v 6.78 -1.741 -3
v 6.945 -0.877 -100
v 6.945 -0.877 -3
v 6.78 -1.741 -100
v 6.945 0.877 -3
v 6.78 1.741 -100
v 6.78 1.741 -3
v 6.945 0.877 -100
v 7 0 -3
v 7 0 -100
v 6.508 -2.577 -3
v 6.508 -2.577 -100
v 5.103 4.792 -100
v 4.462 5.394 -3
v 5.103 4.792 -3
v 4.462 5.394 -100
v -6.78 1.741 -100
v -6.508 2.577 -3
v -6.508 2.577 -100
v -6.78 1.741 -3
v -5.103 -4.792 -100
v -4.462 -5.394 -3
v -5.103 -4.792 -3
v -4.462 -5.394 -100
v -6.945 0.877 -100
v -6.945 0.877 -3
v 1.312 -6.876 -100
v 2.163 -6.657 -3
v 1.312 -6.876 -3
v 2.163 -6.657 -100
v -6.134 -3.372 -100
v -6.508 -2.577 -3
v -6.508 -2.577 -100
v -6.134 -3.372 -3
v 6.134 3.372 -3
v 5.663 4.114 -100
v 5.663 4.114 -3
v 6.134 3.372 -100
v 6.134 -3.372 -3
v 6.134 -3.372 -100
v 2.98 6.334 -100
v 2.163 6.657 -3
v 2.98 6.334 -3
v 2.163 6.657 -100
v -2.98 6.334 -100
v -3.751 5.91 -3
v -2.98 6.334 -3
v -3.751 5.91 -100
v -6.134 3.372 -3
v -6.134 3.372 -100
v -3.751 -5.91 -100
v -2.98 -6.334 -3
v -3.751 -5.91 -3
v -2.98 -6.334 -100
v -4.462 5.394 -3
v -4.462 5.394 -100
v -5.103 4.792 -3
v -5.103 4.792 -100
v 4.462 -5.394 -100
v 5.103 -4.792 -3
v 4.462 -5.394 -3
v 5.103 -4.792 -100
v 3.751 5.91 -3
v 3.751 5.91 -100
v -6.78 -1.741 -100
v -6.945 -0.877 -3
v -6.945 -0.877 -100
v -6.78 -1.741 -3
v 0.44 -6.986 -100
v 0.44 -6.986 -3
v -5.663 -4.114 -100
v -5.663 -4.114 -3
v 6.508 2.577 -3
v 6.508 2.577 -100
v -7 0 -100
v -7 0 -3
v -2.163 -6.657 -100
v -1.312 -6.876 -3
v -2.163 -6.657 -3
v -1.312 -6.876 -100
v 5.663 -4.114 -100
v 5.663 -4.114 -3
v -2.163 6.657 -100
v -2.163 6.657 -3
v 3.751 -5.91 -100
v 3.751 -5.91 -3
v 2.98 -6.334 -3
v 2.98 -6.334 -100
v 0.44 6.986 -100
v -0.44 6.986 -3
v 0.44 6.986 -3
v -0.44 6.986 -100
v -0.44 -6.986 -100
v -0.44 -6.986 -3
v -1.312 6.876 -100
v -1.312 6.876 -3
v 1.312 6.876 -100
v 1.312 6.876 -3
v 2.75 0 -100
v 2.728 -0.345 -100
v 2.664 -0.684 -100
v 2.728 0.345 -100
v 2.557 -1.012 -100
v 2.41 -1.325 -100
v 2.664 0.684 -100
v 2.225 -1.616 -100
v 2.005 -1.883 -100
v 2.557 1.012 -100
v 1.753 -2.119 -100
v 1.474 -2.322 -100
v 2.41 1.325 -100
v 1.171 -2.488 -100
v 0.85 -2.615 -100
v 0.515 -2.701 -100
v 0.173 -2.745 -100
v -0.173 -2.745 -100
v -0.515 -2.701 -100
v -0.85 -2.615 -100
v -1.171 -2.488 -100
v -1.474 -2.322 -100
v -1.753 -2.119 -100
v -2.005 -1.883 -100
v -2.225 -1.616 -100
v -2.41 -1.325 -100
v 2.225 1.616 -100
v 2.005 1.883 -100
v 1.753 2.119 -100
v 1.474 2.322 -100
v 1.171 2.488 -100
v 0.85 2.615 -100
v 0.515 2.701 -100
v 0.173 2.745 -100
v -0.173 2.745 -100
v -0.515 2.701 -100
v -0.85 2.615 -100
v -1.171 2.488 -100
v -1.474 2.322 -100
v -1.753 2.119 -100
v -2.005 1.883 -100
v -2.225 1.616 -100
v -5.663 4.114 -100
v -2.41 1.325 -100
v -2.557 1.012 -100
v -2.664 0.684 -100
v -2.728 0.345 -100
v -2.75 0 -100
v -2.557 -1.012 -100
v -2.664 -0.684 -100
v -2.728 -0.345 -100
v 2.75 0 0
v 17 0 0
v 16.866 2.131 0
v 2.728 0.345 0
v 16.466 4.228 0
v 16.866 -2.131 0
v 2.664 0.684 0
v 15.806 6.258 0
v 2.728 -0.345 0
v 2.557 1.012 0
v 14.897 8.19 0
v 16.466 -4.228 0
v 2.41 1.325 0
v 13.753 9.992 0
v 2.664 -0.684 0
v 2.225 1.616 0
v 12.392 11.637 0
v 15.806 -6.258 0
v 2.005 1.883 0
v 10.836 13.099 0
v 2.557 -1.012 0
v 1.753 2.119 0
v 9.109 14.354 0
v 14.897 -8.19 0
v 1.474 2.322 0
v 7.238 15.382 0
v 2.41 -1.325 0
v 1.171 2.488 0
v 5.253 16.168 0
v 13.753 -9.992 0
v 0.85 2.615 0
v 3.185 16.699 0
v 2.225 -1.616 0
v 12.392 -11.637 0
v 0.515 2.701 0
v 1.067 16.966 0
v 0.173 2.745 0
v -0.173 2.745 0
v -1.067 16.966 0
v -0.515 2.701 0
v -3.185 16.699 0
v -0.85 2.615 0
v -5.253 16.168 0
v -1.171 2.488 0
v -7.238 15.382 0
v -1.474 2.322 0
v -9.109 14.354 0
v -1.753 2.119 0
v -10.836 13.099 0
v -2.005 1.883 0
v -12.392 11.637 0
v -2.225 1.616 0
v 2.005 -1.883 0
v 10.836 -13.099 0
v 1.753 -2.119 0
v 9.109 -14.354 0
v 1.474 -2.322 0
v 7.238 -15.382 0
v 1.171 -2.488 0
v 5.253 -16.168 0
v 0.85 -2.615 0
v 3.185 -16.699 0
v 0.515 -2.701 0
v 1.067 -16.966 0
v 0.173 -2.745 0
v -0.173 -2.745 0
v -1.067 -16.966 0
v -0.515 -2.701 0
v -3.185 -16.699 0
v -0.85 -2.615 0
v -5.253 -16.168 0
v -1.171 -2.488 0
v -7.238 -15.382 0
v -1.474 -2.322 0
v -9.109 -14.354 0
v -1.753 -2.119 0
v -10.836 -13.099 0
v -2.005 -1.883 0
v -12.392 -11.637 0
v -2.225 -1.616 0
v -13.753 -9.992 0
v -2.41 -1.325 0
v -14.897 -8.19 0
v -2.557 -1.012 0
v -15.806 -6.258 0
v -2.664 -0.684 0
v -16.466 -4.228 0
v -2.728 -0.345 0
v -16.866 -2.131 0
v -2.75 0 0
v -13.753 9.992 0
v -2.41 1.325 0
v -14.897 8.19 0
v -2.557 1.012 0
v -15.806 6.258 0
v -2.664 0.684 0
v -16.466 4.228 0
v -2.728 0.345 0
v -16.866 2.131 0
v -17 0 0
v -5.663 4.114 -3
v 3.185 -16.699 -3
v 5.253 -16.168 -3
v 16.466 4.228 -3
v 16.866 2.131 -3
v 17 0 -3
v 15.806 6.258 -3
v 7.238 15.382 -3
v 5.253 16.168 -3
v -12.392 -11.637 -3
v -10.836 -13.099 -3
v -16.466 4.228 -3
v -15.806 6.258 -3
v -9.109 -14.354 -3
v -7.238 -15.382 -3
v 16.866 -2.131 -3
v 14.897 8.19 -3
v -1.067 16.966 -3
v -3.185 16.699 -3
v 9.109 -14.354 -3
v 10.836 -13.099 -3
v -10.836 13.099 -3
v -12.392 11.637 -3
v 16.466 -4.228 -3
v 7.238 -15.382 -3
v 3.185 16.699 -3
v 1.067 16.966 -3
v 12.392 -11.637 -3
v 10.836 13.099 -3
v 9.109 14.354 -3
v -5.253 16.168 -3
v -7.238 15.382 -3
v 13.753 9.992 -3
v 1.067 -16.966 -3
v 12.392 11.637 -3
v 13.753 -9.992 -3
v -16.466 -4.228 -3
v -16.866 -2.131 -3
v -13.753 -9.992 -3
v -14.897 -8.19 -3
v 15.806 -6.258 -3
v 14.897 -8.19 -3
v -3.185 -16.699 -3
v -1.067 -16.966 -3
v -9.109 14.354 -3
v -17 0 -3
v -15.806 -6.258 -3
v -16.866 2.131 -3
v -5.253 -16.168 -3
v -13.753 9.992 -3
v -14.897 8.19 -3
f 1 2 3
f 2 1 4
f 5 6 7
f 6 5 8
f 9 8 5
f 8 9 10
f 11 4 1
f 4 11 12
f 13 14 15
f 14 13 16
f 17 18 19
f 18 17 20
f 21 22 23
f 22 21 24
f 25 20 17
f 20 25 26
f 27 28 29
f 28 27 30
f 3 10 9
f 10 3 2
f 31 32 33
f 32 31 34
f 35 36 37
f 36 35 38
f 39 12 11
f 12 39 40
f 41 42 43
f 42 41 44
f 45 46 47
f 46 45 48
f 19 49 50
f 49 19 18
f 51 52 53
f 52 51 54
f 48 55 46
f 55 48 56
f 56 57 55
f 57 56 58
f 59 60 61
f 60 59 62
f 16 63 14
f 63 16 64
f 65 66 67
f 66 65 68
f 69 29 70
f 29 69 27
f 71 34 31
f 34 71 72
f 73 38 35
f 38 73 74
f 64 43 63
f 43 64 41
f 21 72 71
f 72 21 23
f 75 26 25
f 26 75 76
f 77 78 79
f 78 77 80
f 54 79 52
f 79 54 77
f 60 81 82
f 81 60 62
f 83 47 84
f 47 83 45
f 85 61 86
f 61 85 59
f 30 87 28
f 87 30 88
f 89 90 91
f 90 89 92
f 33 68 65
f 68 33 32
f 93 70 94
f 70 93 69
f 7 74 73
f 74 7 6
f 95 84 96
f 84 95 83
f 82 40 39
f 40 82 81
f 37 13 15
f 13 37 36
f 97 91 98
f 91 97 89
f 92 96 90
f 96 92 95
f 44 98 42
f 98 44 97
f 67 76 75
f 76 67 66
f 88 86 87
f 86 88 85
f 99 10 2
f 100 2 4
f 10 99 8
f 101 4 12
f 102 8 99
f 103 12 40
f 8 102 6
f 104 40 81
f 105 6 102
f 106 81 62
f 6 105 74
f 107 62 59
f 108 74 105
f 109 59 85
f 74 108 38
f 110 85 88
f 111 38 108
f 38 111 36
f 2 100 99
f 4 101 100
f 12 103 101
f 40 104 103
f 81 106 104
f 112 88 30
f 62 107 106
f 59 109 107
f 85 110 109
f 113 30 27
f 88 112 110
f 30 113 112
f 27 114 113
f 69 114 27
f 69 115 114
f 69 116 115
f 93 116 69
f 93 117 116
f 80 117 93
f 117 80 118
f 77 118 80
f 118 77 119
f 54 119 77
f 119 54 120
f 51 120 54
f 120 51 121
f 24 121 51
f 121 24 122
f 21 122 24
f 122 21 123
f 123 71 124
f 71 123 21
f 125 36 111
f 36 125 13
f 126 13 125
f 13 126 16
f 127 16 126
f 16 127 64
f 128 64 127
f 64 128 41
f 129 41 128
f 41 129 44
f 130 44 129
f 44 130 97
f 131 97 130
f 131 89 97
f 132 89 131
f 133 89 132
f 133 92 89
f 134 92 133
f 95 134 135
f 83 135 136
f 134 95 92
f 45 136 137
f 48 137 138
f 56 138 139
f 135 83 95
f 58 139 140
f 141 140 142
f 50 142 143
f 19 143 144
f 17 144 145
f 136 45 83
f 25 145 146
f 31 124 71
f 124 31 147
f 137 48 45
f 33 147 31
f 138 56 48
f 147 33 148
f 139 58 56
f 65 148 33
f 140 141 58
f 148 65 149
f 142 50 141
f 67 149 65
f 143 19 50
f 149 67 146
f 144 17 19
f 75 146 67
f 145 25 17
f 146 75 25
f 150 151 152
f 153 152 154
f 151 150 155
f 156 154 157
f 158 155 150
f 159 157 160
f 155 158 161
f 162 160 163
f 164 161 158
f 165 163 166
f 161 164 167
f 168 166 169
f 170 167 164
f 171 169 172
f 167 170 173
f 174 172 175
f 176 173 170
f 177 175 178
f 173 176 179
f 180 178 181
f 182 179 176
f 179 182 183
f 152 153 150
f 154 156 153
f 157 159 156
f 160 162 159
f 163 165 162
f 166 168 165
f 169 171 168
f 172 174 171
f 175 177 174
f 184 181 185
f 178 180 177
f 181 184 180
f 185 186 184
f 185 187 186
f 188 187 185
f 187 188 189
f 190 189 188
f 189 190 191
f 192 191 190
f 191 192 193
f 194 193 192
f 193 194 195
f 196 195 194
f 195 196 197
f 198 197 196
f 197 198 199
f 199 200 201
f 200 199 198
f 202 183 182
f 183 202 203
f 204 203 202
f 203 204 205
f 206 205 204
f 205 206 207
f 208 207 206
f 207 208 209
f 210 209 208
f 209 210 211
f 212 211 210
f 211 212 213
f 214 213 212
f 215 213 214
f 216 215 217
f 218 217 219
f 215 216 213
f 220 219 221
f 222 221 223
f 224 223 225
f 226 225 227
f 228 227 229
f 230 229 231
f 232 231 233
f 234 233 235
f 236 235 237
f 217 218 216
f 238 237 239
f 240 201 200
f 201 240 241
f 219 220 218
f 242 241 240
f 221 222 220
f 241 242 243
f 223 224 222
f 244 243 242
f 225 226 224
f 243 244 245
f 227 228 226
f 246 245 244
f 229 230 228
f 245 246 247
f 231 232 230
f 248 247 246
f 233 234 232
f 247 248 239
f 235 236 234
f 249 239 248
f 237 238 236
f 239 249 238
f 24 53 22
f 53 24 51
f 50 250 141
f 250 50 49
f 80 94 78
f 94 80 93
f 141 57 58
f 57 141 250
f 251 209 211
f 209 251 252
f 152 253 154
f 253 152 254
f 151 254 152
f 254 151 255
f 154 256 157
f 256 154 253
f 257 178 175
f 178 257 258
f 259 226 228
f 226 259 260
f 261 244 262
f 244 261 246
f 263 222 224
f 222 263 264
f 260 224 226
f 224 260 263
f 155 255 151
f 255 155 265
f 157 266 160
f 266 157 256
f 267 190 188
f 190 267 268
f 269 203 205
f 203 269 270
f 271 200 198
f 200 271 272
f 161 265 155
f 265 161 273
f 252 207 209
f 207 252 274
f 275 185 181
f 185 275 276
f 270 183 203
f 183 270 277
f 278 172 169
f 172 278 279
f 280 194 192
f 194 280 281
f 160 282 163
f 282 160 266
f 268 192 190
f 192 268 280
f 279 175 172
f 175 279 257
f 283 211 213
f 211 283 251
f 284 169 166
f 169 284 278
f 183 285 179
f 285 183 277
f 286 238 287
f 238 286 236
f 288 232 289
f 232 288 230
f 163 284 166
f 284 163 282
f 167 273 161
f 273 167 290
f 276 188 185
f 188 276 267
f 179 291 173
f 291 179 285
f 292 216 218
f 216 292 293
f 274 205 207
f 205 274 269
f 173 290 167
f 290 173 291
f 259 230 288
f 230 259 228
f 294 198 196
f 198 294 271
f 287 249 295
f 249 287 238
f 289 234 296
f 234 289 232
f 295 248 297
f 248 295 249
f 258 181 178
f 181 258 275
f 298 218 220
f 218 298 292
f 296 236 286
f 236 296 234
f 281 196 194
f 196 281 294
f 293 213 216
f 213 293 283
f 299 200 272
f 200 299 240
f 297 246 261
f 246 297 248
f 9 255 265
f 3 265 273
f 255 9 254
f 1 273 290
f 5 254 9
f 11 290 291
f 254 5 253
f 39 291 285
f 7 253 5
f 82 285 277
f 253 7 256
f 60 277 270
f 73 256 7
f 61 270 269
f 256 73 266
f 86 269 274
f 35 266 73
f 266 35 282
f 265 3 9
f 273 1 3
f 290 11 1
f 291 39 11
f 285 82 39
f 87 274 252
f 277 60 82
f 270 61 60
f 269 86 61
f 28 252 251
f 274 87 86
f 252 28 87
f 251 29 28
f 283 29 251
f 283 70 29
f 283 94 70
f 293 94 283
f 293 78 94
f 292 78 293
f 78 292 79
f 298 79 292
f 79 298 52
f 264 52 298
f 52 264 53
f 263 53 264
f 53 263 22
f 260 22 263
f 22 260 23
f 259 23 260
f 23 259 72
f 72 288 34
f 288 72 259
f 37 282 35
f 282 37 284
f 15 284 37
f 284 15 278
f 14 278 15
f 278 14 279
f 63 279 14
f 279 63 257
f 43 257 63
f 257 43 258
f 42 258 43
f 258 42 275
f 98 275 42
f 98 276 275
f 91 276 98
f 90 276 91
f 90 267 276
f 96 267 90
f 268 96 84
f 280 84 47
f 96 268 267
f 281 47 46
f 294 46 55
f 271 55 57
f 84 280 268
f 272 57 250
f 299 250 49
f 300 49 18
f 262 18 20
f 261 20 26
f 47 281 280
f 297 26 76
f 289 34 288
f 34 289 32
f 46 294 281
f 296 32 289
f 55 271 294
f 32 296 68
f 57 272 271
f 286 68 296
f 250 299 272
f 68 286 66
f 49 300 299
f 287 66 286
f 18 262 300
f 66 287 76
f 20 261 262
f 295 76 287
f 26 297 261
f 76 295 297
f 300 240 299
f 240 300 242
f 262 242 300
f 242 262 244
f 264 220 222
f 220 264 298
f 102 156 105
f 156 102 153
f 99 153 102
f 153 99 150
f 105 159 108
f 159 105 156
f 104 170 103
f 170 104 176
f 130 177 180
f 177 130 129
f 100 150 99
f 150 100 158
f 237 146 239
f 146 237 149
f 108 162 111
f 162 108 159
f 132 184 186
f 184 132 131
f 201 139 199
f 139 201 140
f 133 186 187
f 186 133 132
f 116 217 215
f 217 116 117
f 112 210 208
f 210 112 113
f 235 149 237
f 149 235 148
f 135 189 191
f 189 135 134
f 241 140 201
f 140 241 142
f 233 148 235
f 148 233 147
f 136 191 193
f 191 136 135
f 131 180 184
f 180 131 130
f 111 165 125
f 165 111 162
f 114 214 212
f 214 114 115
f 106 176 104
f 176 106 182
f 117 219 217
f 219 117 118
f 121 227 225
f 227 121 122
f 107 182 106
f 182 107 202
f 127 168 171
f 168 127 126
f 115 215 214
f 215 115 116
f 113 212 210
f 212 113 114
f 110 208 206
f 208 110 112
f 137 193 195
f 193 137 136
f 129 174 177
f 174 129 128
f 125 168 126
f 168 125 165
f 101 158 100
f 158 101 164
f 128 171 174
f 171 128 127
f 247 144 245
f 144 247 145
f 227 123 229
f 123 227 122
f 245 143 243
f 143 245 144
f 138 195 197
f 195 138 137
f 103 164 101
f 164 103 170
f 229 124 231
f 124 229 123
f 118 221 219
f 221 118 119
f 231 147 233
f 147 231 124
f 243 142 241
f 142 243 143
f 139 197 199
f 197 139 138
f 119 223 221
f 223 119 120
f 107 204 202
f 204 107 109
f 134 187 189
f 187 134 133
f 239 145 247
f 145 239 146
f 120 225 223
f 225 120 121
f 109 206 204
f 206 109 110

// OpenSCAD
$fn = 50;


difference() {
	union() {
		translate(v = [0, 0, -100.0000000000]) {
			cylinder(h = 100, r = 7.0000000000);
		}
		translate(v = [0, 0, -3.0000000000]) {
			cylinder(h = 3, r = 17.0000000000);
		}
	}
	union() {
		#translate(v = [0, 0, -100]) {
			cylinder(h = 100, r = 2.7500000000);
		}
	}
}
